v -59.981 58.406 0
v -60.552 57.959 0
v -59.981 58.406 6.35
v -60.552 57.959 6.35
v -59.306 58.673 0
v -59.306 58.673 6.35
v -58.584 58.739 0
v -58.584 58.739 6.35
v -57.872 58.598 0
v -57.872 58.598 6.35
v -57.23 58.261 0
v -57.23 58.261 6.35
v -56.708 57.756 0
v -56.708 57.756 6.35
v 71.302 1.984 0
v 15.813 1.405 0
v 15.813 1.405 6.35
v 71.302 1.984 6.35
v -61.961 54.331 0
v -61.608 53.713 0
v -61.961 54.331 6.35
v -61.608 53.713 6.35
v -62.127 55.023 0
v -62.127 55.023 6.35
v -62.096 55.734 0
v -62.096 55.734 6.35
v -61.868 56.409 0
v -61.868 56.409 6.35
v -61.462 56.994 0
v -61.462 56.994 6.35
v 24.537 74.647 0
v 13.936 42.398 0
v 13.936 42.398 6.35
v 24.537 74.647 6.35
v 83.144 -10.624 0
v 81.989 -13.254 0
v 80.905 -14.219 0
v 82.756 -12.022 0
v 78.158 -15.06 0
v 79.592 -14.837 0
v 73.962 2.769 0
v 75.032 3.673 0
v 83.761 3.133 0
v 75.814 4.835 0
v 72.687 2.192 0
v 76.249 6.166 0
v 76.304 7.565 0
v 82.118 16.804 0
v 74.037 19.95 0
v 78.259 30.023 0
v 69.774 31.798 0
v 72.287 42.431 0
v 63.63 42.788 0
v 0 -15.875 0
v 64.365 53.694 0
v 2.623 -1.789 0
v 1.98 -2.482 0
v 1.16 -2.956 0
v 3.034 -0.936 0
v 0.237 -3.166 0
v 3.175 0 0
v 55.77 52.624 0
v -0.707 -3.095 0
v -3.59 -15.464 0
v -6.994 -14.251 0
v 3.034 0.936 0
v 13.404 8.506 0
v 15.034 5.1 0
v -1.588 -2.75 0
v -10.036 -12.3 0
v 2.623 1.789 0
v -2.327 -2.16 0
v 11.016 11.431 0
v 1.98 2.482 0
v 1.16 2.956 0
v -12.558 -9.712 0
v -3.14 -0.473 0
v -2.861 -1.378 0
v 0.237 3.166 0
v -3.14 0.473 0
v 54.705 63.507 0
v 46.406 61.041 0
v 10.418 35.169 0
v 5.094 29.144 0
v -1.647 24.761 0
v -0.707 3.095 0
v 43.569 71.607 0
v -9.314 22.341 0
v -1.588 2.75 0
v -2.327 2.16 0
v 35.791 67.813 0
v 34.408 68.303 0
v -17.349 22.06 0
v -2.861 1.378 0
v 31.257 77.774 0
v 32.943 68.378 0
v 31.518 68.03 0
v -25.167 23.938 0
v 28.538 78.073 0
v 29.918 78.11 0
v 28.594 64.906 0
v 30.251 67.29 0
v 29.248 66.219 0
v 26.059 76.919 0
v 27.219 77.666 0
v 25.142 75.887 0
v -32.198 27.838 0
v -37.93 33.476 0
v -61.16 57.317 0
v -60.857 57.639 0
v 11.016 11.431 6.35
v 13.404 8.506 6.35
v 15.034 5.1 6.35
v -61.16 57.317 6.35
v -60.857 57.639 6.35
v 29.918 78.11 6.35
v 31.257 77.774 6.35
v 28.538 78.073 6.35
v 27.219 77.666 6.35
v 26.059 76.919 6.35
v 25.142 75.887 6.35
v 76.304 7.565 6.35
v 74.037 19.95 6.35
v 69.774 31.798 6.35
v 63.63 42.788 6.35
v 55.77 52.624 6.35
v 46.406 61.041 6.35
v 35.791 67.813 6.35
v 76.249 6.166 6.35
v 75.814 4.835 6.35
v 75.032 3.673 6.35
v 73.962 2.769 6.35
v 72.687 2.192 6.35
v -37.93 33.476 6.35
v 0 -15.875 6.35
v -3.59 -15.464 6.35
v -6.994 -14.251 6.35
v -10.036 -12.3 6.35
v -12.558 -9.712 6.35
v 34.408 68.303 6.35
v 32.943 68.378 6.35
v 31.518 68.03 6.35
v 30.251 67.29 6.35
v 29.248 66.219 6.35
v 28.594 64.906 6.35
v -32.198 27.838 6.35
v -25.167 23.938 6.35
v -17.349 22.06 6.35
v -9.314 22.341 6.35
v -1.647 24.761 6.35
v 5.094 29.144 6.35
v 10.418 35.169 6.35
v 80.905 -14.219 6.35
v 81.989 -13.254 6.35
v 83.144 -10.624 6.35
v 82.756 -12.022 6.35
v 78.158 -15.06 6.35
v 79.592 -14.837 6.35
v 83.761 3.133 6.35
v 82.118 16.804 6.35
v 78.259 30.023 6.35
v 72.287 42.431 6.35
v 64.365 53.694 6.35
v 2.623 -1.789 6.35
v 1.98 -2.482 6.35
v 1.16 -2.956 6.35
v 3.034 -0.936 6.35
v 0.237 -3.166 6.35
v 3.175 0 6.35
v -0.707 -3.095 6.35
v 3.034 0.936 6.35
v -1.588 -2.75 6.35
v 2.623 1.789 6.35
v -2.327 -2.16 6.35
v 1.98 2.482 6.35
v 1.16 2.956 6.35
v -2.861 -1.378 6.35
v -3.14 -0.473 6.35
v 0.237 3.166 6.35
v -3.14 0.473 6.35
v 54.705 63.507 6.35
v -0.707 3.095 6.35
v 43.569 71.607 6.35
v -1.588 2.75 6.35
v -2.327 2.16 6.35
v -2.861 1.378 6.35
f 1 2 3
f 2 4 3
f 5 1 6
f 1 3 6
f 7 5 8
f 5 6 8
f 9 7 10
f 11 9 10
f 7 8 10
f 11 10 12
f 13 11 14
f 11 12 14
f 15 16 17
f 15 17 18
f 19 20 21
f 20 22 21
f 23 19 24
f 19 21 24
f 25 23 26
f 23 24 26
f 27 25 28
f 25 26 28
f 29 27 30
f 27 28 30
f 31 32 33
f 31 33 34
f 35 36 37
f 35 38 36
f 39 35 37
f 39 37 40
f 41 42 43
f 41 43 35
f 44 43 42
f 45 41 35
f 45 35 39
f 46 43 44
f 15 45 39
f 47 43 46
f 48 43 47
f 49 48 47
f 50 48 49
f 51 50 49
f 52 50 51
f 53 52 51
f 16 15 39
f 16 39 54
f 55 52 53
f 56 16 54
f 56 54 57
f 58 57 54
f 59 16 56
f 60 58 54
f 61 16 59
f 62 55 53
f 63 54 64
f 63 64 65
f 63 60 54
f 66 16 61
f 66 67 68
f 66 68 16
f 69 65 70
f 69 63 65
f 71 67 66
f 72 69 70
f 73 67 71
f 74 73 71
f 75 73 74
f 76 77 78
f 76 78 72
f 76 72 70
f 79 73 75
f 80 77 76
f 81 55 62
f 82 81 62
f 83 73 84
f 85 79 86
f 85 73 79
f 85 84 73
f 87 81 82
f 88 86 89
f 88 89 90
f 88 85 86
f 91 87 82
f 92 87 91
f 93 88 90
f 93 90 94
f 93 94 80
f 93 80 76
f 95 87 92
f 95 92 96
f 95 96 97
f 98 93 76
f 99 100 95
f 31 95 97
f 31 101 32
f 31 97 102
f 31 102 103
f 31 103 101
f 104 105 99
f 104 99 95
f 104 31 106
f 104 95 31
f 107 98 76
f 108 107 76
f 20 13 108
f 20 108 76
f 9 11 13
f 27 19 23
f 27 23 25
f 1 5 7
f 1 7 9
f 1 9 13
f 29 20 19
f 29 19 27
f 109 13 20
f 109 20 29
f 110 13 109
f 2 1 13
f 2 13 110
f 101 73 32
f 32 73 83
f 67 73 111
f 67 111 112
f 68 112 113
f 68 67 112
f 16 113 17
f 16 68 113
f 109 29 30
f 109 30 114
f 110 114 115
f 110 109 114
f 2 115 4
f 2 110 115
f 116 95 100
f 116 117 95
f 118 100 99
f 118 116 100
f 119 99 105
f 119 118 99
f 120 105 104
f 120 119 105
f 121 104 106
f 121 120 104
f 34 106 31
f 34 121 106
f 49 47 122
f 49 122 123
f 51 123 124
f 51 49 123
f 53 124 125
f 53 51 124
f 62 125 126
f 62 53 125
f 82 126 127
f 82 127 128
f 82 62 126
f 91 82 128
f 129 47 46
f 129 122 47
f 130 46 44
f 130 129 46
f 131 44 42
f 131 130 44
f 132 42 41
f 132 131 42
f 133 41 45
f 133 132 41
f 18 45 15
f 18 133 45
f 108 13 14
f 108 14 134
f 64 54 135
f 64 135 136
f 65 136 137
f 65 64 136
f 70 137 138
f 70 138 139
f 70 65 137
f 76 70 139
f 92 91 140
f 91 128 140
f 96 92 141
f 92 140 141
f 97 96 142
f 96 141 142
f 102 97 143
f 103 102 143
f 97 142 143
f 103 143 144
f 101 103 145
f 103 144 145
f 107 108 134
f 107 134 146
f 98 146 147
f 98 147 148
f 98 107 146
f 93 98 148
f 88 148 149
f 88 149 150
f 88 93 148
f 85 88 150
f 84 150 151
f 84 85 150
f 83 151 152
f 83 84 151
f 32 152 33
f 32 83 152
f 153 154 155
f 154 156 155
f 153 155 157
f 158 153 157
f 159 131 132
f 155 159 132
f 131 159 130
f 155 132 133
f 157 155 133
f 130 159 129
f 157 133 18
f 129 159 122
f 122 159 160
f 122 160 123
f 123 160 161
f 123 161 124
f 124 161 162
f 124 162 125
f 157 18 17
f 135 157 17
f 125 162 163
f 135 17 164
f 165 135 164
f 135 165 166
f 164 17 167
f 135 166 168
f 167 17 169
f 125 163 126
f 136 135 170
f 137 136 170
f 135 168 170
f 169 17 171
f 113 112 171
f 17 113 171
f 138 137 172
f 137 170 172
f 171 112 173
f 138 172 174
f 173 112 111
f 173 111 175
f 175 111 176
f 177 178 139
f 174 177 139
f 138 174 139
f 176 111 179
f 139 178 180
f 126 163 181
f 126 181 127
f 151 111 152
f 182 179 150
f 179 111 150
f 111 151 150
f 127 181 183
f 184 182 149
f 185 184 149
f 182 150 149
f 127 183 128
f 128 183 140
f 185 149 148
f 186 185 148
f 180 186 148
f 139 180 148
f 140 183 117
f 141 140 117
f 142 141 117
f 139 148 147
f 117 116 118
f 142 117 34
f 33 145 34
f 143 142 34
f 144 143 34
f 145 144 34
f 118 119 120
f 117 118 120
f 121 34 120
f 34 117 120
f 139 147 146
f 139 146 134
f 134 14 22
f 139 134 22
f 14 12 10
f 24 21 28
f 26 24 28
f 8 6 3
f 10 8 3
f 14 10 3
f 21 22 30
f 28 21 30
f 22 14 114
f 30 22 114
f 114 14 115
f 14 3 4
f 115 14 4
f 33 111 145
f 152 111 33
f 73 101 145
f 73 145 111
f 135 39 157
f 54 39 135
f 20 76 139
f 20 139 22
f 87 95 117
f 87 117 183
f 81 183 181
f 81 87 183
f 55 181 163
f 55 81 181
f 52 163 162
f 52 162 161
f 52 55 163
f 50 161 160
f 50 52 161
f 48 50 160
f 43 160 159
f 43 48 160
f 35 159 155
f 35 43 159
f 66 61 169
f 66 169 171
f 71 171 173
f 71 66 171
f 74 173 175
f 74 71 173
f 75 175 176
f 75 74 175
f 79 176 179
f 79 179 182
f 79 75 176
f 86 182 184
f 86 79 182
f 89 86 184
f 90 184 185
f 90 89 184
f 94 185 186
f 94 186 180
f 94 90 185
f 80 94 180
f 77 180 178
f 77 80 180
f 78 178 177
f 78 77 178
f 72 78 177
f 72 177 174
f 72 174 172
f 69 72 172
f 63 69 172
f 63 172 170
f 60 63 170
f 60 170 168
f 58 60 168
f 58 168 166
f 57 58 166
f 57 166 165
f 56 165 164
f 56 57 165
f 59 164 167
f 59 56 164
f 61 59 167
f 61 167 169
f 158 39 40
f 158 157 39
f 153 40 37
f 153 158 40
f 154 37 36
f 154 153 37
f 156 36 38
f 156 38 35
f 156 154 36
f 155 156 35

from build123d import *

# Parameters (mm, degrees)
SKETCH1_R           = 3.175
BOSS_EXTRUDE1_DEPTH = 6.35
FILLET1_R           = 5.08
FILLET2_R           = 2.54


with BuildPart() as part:
    # Sketch1 → Boss-Extrude1 (new body)
    with BuildSketch(Plane.XY):
        with BuildLine():
            Line((-12.557727148, -9.711802813), (-62.907969157, 55.392958186))
            ThreePointArc((-62.907969157, 55.392958186), (-60.738998149, 57.76302021), (-58.480795155, 60.048222272))
            Line((-58.480795155, 60.048222272), (-37.93049883, 33.475914427))
            ThreePointArc((-37.93049883, 33.475914427), (-9.314173502, 22.341362046), (13.936413388, 42.398344403))
            Line((13.936413388, 42.398344403), (26.174060388, 79.628581318))
            ThreePointArc((26.174060388, 79.628581318), (72.040987894, 42.847269029), (82.4642609, -15.014595376))
            Line((82.4642609, -15.014595376), (0, -15.875))
            ThreePointArc((0, -15.875), (-6.994310379, -14.251148983), (-12.557727148, -9.711802813))
        make_face()
        Circle(SKETCH1_R, mode=Mode.SUBTRACT)
        with BuildLine():
            Line((30.398061223, 70.395411405), (11.01621883, 11.430596996))
            ThreePointArc((11.01621883, 11.430596996), (14.320406292, 6.851393189), (15.812676769, 1.405303663))
            Line((15.812676769, 1.405303663), (76.65111989, 2.04007171))
            ThreePointArc((76.65111989, 2.04007171), (63.505865166, 42.971632067), (30.398061223, 70.395411405))
        make_face(mode=Mode.SUBTRACT)
    extrude(amount=BOSS_EXTRUDE1_DEPTH)

    # Fillet1
    fillet1_edges = [part.edges().sort_by_distance(p)[0] for p in [
        (76.65111989, 2.04007171, 3.175),
        (30.398061223, 70.395411405, 3.175),
        (26.174060388, 79.628581318, 3.175),
        (82.4642609, -15.014595376, 3.175),
    ]]
    fillet(fillet1_edges, radius=FILLET1_R)

    # Fillet2
    fillet2_edges = [part.edges().sort_by_distance(p)[0] for p in [
        (-62.907969157, 55.392958186, 3.175),
        (-58.480795155, 60.048222272, 3.175),
    ]]
    fillet(fillet2_edges, radius=FILLET2_R)


solid = part.part
